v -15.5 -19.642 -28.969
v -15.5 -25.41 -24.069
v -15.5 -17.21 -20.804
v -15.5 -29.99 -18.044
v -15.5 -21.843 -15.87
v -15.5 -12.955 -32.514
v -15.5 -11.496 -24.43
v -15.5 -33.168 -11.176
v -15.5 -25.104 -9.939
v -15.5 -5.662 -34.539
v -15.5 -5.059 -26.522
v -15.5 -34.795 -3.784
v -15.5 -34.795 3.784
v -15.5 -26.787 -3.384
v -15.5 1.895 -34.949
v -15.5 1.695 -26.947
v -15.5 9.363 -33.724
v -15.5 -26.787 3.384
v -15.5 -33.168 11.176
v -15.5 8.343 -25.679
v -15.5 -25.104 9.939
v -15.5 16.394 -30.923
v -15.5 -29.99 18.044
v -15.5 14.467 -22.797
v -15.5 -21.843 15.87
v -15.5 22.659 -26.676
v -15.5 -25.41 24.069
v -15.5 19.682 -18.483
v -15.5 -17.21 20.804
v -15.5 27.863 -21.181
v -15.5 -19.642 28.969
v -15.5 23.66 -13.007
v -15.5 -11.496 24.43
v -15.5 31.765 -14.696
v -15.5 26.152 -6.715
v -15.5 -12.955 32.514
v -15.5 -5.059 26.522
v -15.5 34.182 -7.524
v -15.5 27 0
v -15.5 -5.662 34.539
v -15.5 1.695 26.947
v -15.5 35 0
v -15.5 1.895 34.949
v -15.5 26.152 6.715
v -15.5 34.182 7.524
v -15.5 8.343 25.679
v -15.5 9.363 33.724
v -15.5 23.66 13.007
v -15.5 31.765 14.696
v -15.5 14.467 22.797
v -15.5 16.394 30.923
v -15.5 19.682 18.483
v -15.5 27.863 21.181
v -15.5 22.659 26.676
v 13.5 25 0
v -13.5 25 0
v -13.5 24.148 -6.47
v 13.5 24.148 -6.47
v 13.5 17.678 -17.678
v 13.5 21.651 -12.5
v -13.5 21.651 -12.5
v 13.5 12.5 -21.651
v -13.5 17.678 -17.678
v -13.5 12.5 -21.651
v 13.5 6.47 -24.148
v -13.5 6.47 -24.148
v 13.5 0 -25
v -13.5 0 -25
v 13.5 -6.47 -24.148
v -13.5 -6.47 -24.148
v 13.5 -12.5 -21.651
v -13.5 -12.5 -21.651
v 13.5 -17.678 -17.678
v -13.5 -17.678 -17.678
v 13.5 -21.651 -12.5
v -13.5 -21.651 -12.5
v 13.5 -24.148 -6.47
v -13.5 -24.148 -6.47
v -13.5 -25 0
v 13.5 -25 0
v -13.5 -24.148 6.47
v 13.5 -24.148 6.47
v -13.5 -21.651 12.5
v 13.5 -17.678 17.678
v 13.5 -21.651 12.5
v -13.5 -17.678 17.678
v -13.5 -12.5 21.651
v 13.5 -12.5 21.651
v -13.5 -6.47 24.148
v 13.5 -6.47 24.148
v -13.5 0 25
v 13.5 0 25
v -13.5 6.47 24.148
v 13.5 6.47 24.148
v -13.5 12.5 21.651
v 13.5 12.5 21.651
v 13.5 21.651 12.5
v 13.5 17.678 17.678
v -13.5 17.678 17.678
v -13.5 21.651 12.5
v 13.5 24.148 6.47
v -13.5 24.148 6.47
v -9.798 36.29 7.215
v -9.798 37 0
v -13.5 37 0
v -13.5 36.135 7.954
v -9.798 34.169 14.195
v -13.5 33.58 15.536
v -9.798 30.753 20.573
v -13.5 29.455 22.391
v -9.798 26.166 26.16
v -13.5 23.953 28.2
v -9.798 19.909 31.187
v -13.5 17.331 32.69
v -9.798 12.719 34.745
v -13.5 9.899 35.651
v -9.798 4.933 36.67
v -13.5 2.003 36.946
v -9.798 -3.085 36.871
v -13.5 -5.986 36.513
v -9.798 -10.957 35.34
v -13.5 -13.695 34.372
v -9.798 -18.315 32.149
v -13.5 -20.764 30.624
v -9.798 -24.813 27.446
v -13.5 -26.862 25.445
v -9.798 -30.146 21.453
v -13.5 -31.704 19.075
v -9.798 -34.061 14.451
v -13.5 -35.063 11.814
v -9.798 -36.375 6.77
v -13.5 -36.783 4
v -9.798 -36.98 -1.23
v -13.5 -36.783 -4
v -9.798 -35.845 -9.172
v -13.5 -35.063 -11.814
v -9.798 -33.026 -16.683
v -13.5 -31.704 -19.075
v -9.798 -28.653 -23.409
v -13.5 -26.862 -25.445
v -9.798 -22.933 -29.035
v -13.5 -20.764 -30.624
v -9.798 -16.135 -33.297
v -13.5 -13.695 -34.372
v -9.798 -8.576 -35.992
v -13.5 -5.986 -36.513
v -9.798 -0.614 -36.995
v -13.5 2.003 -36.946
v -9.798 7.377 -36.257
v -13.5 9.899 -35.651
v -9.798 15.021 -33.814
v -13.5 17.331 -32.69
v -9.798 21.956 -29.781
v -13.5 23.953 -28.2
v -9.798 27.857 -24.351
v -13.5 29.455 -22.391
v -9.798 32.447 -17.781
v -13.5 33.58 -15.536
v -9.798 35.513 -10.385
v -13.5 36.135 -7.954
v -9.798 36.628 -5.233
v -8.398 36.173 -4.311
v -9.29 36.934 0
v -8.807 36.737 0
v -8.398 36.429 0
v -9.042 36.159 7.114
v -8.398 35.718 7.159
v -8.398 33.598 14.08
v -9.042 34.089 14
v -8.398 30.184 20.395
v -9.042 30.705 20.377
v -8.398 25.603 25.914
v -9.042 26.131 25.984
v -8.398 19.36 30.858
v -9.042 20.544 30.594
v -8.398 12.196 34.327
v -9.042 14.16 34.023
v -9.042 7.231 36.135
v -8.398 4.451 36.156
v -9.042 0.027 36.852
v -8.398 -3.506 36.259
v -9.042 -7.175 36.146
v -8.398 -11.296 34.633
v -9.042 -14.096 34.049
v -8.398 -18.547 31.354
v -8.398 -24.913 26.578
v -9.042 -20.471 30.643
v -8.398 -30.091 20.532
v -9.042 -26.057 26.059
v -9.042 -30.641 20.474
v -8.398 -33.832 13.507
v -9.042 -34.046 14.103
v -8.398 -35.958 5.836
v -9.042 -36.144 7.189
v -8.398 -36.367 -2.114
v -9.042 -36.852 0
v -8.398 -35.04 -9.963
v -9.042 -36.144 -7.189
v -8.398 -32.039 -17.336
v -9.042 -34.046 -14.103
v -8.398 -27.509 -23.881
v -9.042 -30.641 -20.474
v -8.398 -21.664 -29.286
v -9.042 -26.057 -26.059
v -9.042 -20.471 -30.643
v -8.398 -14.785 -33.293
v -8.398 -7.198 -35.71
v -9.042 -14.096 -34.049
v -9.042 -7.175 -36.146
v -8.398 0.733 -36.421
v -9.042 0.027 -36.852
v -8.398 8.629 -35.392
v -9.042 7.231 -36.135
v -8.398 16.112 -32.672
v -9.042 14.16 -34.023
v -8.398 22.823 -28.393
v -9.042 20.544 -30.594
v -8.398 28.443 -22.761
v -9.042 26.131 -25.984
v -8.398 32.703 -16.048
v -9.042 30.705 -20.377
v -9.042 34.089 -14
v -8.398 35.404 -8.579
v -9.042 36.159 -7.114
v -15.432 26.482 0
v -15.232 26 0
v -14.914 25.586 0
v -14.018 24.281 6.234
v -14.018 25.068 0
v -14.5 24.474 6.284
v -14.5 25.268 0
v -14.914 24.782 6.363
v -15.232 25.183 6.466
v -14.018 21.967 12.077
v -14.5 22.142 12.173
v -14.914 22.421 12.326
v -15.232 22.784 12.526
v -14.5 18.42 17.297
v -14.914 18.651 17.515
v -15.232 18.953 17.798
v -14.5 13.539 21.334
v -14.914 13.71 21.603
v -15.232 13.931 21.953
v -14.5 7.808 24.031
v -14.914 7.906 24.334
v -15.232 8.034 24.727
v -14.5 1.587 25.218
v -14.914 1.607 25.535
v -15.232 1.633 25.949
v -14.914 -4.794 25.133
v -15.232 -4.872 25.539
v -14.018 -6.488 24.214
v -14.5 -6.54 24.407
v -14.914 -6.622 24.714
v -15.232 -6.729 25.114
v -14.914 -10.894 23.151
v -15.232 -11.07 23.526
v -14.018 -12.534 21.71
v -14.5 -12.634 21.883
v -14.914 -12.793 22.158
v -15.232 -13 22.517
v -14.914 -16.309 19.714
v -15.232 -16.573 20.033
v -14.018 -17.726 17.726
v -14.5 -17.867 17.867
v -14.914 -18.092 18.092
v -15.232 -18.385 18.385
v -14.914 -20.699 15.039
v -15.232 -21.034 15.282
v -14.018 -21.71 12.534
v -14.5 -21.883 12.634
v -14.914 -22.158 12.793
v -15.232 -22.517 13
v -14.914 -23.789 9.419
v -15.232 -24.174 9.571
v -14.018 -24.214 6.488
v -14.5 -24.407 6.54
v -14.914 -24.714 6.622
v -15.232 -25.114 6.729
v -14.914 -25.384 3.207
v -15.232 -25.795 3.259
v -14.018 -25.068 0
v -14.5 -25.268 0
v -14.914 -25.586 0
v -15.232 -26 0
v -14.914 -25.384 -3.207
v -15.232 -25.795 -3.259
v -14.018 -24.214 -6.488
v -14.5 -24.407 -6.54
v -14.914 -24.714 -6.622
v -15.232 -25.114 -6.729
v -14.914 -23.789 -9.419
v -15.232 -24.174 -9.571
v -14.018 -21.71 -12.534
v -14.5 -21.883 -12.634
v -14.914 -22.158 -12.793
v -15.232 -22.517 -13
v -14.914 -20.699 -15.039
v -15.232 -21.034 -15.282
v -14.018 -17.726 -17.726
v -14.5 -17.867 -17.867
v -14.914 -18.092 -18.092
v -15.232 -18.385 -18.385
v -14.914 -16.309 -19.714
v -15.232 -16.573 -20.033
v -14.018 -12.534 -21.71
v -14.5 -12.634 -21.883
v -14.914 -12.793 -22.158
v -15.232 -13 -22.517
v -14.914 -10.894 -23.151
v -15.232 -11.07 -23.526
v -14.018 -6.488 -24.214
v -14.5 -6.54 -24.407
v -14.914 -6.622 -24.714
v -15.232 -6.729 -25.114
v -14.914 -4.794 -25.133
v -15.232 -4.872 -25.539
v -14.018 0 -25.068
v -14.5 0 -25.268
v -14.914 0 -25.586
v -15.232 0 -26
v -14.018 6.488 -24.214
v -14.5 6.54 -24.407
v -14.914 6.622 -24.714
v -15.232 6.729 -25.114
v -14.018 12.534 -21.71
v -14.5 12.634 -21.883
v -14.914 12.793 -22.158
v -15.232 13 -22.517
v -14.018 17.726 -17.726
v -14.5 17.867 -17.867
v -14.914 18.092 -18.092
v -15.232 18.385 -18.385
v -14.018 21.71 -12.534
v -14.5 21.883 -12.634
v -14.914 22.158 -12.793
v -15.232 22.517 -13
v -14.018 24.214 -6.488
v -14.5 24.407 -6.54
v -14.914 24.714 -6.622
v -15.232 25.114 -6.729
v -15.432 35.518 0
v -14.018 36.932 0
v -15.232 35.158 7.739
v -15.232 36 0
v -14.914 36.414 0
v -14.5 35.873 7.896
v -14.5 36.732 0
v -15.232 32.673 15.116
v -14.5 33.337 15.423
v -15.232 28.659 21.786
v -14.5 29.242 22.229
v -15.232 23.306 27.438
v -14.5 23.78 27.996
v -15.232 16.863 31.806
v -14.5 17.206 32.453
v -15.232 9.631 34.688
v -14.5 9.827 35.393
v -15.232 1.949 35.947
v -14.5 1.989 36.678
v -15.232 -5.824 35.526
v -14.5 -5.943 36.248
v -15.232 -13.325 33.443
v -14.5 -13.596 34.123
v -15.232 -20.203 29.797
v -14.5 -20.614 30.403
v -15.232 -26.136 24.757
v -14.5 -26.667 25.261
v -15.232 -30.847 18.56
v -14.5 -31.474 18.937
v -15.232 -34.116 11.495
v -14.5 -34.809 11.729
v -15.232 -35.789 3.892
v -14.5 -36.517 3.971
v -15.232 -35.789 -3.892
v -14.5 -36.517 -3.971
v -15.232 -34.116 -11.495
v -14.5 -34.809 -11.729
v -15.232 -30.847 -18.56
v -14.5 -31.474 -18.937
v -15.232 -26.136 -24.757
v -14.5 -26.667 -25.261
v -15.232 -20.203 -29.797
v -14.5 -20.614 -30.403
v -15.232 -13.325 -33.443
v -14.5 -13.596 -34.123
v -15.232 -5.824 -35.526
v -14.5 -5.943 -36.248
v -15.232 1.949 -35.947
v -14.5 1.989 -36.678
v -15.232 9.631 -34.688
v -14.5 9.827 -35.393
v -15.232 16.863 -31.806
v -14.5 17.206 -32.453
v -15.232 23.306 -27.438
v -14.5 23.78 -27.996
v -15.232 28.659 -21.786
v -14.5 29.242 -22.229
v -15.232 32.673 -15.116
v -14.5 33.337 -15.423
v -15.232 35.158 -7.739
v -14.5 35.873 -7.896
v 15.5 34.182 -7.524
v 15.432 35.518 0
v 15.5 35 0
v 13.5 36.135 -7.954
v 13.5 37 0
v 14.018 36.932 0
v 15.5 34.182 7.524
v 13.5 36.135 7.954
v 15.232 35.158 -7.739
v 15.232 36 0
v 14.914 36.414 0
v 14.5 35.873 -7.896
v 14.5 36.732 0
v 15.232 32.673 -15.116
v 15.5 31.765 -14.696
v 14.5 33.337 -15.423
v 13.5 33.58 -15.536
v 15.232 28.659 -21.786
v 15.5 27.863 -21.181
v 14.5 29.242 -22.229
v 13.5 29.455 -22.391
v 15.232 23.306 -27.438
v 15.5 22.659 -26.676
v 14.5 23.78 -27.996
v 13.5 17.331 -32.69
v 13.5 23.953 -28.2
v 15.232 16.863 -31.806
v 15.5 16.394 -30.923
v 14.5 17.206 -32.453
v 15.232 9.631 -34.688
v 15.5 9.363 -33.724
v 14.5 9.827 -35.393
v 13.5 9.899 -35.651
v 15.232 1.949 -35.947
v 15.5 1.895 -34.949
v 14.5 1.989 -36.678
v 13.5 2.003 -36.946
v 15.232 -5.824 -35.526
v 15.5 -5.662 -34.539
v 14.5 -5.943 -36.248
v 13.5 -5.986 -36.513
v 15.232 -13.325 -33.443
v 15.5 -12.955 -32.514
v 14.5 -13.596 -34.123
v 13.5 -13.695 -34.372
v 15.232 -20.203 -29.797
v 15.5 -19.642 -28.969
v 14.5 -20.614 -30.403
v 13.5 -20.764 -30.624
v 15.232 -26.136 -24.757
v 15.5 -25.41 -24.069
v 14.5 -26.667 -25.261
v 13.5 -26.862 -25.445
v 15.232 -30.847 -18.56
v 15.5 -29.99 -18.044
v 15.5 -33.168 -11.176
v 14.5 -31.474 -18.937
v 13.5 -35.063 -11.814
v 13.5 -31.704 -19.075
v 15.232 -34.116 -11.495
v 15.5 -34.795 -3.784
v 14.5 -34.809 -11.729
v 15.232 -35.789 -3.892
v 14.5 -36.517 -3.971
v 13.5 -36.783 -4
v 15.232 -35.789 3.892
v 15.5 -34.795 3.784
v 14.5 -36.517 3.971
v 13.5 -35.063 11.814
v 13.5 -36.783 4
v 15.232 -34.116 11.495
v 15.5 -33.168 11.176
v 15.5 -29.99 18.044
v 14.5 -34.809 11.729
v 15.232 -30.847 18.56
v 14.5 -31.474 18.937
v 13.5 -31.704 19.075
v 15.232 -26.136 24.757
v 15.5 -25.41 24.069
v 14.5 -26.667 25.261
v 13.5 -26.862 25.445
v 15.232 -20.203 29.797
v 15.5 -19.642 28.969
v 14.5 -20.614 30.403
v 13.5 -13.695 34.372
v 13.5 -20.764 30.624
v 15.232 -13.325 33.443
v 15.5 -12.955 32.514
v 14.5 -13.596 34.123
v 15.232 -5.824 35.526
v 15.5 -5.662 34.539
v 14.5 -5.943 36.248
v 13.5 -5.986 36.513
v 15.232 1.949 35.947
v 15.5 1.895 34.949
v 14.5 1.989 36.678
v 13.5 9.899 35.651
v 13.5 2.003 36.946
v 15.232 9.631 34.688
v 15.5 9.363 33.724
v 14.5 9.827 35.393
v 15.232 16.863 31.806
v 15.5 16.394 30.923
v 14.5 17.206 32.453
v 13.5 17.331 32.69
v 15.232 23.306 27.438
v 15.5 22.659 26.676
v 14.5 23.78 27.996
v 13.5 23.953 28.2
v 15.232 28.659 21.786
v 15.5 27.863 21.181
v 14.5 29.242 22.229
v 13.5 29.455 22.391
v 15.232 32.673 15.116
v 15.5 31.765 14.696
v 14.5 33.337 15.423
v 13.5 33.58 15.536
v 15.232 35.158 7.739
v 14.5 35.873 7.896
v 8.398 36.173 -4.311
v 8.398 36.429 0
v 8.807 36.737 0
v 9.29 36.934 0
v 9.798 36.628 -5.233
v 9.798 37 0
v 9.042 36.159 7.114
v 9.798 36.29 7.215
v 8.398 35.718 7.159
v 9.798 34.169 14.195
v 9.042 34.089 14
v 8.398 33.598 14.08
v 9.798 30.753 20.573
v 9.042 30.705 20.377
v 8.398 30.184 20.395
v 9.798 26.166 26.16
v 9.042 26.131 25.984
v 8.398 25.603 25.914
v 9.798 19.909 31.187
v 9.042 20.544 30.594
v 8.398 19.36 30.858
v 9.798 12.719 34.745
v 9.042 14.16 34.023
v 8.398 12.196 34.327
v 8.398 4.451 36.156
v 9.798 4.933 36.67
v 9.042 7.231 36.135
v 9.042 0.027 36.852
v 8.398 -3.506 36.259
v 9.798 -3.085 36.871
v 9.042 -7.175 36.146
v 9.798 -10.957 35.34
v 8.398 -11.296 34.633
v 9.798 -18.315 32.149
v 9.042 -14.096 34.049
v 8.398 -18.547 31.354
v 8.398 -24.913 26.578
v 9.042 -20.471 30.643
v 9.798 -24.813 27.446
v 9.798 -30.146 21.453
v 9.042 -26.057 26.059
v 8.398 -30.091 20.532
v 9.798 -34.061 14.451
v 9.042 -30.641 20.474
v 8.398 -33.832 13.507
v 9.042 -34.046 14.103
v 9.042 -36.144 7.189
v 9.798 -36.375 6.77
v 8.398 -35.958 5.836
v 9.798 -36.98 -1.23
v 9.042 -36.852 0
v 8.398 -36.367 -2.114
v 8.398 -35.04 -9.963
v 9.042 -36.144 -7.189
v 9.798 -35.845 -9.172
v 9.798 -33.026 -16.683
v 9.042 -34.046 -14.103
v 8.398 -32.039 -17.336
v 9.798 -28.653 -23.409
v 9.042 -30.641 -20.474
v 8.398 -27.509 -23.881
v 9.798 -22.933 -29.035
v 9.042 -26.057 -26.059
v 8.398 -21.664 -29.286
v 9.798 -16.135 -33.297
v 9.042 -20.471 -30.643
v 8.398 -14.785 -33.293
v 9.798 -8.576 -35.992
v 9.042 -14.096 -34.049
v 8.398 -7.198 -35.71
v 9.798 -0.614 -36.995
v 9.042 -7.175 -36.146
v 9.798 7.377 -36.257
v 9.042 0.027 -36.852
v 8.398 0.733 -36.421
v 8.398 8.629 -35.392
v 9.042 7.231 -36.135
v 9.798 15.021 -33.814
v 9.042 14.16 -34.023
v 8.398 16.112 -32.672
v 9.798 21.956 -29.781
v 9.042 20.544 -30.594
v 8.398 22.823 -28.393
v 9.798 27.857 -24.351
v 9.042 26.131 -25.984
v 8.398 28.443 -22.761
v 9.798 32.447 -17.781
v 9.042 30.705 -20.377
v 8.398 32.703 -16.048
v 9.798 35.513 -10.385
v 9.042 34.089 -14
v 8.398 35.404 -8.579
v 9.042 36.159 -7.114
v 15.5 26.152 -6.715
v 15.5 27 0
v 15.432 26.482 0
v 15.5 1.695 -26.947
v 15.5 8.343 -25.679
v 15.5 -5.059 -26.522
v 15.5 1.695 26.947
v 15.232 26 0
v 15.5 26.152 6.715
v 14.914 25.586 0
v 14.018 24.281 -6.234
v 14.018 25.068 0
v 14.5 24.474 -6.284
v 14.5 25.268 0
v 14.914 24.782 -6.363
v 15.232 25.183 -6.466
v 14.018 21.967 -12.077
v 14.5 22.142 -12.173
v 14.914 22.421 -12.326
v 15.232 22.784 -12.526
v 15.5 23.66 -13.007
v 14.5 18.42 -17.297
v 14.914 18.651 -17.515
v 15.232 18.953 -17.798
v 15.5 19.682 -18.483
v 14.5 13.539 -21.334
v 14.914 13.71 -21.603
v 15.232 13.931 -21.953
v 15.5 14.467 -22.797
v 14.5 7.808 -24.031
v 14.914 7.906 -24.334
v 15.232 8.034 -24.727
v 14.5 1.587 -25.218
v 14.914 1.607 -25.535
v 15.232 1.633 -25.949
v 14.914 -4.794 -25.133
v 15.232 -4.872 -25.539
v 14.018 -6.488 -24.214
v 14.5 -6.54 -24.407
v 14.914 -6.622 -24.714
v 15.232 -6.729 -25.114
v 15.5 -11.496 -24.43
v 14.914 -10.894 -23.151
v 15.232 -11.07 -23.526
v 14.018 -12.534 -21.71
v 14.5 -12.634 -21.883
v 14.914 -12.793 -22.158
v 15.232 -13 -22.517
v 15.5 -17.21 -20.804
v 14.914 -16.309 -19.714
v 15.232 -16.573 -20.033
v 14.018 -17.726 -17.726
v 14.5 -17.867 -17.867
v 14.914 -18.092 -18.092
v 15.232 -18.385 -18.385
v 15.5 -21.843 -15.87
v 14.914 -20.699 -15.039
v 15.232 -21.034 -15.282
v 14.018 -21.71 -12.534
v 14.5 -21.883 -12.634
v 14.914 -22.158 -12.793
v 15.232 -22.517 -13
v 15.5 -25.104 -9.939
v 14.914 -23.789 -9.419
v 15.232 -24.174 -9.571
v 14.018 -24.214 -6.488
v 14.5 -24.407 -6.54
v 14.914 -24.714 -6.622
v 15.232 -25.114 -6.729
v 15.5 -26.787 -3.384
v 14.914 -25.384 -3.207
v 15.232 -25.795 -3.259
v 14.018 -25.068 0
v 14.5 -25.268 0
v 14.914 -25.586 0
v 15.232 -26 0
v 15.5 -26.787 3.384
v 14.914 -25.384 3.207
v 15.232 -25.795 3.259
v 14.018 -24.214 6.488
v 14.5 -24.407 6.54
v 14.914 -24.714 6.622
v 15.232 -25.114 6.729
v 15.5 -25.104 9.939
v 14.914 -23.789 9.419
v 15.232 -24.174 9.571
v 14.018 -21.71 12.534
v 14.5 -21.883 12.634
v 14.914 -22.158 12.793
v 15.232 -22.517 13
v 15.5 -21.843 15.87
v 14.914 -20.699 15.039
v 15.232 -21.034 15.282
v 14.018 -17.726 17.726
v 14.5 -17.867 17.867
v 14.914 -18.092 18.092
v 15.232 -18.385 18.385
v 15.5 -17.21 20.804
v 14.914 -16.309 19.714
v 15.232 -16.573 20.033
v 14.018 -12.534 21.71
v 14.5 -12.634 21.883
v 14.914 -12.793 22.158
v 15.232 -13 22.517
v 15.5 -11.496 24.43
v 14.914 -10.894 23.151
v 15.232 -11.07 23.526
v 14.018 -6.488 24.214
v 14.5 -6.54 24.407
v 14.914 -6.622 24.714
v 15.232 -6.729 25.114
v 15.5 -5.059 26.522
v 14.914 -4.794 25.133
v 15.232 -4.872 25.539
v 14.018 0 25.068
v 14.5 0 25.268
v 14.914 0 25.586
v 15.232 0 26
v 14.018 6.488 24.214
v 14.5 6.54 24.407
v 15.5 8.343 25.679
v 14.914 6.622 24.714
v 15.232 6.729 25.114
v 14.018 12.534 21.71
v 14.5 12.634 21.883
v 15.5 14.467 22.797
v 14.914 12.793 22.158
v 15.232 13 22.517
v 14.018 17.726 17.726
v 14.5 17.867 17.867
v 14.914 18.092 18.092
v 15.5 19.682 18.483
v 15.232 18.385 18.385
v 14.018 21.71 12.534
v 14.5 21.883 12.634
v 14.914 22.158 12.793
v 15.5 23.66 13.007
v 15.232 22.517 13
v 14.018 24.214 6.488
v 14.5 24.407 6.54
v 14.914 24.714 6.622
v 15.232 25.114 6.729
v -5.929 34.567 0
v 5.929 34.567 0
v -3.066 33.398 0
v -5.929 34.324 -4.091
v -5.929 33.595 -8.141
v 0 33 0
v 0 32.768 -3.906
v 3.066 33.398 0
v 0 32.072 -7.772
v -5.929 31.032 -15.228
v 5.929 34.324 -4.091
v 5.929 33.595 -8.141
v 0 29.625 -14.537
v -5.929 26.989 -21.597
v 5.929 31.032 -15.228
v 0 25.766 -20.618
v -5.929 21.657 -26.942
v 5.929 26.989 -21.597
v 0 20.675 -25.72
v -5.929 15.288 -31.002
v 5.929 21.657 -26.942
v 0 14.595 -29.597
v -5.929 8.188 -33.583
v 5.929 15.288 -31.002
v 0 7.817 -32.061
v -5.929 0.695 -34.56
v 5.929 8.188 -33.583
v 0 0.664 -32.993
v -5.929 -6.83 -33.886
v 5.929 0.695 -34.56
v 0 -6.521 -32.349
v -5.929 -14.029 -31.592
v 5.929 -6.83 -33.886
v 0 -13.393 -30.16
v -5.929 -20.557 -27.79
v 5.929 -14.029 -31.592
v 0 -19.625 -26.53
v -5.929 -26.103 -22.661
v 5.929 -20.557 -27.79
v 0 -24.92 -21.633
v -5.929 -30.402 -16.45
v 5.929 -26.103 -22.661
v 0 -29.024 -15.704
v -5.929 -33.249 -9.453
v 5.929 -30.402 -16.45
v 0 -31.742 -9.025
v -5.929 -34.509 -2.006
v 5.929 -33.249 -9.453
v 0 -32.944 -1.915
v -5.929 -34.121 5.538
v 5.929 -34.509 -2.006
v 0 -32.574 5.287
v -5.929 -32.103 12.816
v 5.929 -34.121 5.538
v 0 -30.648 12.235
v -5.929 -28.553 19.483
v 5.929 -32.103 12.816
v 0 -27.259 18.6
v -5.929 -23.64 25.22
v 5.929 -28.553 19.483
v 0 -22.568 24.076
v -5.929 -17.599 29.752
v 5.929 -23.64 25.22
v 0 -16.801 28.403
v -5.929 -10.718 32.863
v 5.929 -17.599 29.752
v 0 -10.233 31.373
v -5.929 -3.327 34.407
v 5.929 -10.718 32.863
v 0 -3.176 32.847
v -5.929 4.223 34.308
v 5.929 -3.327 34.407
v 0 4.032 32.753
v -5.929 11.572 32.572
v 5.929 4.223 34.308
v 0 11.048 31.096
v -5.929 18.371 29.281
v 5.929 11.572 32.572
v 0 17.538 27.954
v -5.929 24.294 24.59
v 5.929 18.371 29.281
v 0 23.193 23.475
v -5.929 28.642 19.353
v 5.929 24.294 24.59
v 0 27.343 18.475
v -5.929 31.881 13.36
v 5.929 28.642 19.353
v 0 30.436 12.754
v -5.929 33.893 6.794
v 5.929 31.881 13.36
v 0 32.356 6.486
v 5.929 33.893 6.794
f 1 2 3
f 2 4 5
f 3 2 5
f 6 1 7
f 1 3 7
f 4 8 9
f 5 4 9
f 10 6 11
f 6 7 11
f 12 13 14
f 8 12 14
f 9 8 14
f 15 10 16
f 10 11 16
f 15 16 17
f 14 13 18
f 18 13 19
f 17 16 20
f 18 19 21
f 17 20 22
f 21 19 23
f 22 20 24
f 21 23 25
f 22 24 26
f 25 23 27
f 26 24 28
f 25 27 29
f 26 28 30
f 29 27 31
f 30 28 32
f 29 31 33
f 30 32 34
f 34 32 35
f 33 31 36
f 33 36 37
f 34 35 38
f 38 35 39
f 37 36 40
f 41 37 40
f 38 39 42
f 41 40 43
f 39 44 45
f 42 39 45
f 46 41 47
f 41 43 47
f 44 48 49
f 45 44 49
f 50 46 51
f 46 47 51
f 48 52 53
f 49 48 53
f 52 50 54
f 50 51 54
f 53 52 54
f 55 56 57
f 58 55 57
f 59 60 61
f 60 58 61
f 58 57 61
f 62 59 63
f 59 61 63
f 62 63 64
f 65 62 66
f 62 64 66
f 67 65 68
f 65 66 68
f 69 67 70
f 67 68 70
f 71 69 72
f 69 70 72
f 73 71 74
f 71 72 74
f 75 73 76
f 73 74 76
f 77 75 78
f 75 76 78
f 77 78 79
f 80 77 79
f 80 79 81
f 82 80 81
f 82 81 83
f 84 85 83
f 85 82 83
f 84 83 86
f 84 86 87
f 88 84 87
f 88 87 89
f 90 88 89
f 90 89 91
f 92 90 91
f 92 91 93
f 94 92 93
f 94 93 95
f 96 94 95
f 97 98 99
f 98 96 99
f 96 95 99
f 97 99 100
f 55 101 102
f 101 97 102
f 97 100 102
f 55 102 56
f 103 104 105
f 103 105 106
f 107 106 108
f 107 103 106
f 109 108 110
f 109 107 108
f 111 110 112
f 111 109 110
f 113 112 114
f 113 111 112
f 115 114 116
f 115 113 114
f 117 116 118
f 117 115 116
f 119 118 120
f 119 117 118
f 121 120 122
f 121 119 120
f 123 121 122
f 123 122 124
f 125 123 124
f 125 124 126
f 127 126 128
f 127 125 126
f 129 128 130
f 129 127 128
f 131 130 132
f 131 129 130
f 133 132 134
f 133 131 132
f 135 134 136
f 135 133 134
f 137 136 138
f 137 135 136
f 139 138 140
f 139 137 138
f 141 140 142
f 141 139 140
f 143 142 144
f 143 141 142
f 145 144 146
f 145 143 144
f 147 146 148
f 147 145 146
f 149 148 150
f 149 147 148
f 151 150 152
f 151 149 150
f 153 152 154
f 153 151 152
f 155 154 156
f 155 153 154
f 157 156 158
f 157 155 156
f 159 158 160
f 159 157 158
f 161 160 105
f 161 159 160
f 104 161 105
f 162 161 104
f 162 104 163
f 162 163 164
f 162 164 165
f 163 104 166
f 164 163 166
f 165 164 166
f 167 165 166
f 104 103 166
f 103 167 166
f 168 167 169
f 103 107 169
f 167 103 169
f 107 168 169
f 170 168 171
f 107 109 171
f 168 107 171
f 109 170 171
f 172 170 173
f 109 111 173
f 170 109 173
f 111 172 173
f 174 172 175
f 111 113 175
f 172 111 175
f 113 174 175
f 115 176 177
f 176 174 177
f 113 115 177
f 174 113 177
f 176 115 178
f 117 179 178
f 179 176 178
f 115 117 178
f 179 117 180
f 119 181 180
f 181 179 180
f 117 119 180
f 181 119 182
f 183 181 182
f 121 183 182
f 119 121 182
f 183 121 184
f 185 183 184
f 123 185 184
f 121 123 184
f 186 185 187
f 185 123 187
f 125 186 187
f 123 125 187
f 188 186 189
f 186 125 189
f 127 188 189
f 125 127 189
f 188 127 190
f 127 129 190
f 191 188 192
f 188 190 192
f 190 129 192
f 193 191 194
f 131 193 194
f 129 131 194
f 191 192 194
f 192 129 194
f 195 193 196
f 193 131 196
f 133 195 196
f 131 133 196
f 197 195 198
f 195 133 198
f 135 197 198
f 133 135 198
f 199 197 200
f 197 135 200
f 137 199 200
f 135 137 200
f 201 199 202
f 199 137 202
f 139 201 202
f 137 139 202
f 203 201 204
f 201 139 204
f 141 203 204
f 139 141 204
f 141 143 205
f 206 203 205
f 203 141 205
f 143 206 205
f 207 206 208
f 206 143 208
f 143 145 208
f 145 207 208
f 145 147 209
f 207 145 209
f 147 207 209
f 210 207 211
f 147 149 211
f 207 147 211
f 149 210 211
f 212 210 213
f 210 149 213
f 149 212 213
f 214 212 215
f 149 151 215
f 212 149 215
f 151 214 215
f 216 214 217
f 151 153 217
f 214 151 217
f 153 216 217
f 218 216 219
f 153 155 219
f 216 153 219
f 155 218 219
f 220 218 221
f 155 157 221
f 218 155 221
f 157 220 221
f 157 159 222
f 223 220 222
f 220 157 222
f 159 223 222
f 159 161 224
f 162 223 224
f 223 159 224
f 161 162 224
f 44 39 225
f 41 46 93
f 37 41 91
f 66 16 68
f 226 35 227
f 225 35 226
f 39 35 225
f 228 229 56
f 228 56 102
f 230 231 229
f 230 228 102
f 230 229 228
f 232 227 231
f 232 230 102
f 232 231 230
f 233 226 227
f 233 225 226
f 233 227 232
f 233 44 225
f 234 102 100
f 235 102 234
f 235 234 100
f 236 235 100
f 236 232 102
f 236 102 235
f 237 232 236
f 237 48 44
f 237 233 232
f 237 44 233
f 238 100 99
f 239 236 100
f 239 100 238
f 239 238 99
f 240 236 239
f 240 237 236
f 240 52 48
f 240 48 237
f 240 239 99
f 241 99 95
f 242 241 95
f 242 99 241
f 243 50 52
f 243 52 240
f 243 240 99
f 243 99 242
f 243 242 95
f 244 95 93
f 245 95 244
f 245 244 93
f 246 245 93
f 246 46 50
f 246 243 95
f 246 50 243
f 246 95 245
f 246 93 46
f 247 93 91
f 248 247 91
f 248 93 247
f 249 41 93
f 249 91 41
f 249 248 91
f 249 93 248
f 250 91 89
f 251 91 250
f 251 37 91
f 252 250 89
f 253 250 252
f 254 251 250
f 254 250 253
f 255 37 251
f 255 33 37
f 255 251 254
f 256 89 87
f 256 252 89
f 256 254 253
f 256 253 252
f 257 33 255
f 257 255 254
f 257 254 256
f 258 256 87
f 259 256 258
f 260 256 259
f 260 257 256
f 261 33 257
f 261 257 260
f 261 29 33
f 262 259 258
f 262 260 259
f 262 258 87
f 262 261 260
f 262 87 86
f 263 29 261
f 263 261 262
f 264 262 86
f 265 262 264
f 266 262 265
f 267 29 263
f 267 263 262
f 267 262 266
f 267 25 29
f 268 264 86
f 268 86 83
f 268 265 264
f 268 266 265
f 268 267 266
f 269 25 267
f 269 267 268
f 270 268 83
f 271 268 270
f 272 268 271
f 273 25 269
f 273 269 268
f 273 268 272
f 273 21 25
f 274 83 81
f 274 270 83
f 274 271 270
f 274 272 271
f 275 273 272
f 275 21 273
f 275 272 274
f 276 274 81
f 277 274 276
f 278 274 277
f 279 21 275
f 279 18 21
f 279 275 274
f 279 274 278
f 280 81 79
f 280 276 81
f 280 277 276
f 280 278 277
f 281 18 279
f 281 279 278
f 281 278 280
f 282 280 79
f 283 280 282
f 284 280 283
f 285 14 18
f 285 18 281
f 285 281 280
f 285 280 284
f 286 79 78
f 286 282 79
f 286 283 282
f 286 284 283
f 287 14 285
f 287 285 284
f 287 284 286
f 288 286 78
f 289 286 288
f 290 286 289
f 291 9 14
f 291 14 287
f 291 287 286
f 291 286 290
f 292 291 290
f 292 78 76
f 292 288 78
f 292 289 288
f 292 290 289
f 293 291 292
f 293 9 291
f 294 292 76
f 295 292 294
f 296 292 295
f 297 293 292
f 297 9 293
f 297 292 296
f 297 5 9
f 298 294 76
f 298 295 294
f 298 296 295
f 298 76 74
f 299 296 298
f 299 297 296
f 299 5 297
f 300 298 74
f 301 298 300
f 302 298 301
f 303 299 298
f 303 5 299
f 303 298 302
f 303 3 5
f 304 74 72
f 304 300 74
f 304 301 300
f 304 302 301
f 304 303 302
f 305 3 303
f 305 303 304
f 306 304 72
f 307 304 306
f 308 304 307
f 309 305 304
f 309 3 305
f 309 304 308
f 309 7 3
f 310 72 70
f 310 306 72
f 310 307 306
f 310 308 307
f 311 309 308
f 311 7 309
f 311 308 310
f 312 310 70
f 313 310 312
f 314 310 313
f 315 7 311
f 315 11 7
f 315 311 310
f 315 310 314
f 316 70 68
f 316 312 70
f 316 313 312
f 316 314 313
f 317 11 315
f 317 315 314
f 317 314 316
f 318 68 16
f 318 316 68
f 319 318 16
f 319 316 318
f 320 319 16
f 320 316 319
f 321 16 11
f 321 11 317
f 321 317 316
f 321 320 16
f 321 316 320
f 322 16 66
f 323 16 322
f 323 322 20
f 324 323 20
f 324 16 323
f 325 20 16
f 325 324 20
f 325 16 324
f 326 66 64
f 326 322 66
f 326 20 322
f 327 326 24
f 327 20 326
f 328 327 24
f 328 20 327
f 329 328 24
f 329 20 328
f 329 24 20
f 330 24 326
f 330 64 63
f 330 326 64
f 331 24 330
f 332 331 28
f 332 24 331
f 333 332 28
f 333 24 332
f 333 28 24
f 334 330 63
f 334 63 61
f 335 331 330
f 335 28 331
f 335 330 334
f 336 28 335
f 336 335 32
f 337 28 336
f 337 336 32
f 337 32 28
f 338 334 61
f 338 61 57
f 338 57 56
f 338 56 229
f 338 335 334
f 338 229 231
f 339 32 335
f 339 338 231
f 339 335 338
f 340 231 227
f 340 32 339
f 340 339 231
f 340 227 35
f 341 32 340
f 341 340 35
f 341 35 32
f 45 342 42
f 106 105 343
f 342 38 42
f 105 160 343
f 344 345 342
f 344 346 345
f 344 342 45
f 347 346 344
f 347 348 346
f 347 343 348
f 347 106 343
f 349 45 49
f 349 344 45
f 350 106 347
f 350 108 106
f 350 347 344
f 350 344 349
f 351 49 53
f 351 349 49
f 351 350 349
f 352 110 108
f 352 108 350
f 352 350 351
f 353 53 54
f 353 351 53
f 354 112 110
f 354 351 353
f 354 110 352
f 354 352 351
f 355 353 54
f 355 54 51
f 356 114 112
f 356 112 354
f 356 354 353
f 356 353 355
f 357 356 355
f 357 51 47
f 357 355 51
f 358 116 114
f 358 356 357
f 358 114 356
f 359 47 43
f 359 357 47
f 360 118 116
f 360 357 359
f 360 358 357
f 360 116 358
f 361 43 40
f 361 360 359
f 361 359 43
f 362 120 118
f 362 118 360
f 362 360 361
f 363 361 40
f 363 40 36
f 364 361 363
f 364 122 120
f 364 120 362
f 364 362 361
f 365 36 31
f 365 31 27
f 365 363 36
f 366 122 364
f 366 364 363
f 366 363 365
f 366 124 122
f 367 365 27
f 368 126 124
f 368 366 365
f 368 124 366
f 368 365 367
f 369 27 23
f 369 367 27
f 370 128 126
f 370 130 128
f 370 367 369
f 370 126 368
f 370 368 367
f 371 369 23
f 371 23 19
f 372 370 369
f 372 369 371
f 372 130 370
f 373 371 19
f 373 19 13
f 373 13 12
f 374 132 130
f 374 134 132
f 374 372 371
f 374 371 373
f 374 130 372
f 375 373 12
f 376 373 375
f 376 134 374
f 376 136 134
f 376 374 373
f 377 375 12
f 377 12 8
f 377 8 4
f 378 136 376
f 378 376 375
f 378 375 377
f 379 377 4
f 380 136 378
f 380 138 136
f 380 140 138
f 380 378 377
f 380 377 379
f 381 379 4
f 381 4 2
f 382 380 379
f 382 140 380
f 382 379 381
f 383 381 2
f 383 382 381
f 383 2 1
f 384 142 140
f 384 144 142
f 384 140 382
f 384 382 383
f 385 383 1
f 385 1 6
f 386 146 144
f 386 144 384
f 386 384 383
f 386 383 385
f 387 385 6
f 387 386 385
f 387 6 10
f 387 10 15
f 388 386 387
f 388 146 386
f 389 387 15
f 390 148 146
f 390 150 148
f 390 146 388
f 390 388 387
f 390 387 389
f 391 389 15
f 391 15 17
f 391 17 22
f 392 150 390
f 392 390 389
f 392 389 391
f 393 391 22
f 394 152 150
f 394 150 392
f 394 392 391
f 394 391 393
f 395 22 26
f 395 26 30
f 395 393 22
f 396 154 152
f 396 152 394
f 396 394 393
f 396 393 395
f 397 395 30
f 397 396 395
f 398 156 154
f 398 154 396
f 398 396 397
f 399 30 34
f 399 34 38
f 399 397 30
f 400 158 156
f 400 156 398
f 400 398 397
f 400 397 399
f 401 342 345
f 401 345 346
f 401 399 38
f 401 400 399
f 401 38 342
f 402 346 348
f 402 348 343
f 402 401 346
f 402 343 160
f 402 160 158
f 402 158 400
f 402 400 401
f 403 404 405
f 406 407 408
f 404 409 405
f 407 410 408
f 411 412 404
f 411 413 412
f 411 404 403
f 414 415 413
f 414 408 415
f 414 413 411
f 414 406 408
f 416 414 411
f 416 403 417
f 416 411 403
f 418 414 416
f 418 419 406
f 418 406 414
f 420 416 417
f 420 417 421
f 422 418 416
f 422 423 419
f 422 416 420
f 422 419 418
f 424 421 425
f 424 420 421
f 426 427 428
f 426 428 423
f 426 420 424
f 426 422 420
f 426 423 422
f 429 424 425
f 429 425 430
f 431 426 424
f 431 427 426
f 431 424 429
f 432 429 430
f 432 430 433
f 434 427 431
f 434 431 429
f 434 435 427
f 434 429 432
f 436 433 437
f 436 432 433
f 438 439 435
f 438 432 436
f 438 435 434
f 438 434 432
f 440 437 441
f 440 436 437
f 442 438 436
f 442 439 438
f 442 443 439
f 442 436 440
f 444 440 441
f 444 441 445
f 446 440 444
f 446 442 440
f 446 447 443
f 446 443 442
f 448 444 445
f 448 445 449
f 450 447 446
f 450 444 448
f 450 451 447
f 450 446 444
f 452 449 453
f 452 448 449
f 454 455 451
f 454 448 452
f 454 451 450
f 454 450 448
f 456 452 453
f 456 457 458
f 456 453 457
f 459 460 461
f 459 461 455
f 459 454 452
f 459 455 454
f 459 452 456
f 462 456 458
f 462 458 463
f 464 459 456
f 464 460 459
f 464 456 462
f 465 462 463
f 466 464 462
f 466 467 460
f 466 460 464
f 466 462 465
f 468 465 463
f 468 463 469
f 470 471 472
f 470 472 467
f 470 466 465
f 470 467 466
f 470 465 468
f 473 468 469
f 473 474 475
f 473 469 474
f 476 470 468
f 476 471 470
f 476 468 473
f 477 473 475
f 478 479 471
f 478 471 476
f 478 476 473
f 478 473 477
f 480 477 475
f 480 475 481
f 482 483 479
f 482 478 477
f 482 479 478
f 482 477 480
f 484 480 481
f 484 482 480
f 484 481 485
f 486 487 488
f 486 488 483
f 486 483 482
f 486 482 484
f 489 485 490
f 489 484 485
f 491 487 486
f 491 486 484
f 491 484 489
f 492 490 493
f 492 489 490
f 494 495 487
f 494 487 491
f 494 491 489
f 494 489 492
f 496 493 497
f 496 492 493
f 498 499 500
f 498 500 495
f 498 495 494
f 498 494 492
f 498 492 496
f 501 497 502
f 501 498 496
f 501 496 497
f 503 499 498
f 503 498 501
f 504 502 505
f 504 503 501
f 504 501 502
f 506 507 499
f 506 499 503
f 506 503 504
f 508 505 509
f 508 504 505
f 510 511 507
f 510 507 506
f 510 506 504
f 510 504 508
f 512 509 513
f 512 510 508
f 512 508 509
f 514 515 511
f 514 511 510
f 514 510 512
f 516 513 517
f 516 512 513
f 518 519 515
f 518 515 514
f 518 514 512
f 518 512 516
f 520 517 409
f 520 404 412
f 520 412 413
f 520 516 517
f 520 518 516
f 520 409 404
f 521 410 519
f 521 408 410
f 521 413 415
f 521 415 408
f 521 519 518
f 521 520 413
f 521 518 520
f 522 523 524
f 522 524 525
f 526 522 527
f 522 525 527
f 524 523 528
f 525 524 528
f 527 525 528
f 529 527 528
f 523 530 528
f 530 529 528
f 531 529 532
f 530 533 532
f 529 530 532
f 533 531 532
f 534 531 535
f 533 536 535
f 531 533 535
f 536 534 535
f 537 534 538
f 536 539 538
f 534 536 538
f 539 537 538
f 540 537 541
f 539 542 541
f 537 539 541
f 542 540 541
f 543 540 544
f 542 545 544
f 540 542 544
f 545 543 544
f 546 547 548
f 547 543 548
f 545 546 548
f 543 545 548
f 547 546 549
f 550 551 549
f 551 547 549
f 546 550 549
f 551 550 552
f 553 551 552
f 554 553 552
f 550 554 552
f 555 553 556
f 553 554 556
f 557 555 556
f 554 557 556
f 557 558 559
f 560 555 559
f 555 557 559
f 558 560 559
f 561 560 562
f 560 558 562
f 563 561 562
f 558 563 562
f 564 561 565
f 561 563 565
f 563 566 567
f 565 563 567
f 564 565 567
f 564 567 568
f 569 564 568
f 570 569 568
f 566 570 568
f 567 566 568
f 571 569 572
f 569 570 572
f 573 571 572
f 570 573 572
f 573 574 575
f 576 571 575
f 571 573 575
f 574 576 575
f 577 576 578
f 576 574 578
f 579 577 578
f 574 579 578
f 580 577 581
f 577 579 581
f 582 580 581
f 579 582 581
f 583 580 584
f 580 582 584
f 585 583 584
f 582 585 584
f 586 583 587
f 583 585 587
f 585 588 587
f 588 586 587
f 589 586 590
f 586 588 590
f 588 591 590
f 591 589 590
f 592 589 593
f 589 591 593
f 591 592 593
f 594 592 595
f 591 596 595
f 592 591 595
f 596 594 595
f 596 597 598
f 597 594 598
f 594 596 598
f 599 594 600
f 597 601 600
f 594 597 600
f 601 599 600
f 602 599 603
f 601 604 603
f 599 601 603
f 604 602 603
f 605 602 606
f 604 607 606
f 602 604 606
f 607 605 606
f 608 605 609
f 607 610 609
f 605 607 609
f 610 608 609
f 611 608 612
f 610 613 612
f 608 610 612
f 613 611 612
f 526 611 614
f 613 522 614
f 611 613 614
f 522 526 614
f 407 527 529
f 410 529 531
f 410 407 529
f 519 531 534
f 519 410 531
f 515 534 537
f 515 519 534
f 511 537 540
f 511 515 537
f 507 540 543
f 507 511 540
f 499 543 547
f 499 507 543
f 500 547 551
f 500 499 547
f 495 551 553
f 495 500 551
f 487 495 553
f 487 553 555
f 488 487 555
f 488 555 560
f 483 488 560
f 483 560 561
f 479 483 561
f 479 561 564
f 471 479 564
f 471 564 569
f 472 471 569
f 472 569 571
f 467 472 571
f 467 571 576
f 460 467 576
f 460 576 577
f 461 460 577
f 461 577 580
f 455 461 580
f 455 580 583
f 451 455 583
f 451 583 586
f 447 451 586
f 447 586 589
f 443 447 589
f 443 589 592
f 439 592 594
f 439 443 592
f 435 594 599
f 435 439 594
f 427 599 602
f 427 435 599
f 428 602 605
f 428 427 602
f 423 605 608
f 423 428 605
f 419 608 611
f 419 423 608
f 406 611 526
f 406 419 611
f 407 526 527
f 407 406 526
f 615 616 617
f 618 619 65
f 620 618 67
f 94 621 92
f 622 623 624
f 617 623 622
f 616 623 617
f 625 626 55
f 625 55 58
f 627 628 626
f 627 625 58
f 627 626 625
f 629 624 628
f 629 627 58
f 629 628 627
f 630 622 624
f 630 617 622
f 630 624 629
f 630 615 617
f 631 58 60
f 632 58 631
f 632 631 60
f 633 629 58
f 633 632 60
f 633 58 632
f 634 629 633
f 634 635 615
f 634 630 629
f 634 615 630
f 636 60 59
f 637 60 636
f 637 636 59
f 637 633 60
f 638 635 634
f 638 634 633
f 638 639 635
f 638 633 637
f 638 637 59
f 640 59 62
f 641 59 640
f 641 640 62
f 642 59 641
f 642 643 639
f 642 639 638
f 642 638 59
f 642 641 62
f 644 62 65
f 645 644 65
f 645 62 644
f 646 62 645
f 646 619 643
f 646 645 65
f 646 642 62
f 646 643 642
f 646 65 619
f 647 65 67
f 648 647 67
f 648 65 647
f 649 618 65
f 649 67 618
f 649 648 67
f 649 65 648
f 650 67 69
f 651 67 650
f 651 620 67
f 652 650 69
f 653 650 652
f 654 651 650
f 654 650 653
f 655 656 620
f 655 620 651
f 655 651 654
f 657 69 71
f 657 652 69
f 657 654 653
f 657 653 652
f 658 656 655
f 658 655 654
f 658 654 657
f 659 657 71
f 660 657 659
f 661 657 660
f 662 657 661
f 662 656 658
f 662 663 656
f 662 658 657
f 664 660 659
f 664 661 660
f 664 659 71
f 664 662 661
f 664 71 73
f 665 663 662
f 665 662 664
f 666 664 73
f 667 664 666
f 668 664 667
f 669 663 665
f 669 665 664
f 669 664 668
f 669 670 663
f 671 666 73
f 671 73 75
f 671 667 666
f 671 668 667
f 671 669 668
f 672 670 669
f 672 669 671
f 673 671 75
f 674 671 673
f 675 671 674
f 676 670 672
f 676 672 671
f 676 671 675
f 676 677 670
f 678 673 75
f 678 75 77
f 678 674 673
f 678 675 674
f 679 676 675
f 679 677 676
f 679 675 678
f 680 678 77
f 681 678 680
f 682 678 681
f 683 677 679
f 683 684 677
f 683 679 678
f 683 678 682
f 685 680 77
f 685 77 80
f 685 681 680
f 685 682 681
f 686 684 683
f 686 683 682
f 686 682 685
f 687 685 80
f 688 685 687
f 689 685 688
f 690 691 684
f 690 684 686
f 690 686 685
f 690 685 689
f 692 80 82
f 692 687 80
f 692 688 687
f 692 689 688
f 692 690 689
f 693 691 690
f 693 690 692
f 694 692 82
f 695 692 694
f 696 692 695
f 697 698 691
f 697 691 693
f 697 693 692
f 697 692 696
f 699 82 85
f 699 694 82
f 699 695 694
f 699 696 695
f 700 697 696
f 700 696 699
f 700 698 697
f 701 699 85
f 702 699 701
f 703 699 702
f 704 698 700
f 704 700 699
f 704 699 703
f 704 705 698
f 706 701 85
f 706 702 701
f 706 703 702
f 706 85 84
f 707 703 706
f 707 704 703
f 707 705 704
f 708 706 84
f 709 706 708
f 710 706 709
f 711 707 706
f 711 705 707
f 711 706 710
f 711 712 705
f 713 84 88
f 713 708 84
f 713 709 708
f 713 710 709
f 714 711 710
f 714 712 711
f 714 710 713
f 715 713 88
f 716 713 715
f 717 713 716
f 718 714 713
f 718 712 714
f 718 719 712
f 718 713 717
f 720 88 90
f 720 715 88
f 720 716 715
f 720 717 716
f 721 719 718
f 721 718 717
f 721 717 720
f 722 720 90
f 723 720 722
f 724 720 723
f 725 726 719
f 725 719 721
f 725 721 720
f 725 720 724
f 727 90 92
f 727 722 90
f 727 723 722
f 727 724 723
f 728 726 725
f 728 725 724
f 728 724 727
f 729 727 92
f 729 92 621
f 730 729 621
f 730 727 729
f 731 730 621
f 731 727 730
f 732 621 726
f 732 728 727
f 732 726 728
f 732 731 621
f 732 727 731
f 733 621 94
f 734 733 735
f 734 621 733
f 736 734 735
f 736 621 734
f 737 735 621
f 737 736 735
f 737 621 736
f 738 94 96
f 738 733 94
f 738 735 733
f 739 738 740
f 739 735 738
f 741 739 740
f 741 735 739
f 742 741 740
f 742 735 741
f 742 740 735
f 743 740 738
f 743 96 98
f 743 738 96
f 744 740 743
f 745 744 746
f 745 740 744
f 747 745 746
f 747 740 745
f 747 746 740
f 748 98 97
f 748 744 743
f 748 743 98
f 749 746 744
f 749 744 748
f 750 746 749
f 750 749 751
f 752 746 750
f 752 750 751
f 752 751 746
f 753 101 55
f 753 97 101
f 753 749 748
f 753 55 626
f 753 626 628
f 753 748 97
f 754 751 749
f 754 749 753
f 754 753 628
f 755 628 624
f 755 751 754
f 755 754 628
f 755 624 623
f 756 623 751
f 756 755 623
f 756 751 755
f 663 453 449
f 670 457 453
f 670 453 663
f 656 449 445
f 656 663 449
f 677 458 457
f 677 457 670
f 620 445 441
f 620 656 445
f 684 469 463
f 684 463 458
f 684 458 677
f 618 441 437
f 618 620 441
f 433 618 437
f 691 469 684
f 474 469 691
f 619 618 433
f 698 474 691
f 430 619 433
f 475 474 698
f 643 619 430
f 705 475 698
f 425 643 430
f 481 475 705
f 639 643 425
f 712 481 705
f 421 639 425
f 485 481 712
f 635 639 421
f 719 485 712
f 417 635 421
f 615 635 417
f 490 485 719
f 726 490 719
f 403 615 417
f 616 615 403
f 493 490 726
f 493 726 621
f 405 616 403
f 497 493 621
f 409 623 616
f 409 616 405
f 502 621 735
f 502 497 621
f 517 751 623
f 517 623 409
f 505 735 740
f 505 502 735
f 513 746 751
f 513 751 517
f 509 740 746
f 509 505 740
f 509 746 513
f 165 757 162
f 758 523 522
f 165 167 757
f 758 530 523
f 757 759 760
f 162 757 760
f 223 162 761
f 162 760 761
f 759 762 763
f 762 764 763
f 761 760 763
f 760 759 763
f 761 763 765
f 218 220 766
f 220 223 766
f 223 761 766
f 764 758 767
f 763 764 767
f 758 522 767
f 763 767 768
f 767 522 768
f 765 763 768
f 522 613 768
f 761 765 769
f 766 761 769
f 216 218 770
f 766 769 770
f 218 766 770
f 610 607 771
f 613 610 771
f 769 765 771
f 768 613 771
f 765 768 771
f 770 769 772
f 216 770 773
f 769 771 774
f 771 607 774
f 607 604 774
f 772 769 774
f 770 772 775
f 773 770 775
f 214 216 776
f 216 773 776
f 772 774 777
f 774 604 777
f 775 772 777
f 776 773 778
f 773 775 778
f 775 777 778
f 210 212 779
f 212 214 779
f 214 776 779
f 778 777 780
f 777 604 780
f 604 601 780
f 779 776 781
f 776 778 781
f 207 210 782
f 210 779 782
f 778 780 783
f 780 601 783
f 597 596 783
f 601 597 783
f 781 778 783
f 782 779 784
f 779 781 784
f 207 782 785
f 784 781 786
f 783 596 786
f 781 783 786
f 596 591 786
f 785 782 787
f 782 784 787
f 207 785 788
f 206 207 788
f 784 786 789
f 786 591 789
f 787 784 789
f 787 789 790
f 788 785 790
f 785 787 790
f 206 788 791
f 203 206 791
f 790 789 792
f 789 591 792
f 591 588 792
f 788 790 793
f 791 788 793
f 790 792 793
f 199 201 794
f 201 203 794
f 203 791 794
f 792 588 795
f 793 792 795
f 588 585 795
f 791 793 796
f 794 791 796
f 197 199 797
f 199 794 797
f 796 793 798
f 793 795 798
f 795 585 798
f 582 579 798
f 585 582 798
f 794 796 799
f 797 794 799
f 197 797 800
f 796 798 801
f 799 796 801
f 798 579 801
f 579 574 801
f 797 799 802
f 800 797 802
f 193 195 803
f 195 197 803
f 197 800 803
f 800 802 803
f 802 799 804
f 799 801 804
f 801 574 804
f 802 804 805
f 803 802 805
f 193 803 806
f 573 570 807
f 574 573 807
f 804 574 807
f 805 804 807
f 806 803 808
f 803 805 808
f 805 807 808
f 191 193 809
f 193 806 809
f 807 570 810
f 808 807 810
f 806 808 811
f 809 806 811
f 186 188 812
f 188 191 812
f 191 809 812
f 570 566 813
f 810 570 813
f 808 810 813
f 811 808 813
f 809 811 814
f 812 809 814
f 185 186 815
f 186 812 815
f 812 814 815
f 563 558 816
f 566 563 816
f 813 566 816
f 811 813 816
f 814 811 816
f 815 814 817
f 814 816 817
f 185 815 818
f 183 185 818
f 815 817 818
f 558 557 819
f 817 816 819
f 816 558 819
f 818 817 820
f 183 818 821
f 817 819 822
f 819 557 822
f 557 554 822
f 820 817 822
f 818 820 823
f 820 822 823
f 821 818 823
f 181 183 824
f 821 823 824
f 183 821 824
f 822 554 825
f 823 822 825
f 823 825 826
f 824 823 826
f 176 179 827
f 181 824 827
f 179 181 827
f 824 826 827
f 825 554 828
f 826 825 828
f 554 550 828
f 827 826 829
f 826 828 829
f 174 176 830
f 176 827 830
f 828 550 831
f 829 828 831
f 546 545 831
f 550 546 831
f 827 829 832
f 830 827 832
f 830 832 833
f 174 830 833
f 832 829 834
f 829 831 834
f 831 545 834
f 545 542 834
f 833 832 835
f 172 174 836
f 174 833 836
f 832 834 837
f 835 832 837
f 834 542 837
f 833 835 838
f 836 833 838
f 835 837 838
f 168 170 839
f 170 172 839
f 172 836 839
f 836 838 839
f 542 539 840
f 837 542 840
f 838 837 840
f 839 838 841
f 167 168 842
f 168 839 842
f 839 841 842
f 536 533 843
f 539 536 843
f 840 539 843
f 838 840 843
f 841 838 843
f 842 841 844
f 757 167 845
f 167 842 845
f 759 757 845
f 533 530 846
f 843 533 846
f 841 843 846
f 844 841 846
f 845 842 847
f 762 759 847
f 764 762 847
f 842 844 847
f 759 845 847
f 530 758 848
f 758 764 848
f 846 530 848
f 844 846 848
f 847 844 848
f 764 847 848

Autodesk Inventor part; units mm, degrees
ref_plane "YZ Plane" through (0, 0, 0) normal (1, 0, 0) x (0, 1, 0)
ref_plane "XZ Plane" through (0, 0, 0) normal (0, 1, 0) x (-1, 0, 0)
ref_plane "XY Plane" through (0, 0, 0) normal (0, 0, 1) x (1, 0, 0)
sketch "Sketch1" plane through (0, 0, 0) normal (0, 0, 1) x (1, 0, 0)
  line L0 (0, -9) -> (0, 54) projected
  line L1 (-21.7, 0) -> (21.7, 0) projected
  line L2 (-15.5, 37) -> (15.5, 37) construction
  line L3 (15.5, 37) -> (15.5, 25)
  line L4 (15.5, 25) -> (-15.5, 25)
  line L5 (-15.5, 25) -> (-15.5, 37)
  arc A0 (-8.9443, 37) -> (8.9443, 37) centre (0, 45) ccw
  line L6 (-15.5, 37) -> (-8.9443, 37)
  line L7 (8.9443, 37) -> (15.5, 37)
  point P0 (0, 0)
  point P1 (0, 37)
  dimension "d0" = 31
  dimension "d1" = 37
  dimension "d2" = 25
  dimension "d3" = 12
  dimension "d4" = 8
revolve "Revolution1" add sketch "Sketch1" angle 360 about axis through (-10, 0, 0) along (1, 0, 0)
fillet "Fillet1" radius 2 6 edges at (15.5, -37, 0) (8.9443, -37, 0) (-8.9443, -37, 0) (-15.5, -37, 0) (15.5, -25, 0) (-15.5, -25, 0)
properties part number "InelInterior"
